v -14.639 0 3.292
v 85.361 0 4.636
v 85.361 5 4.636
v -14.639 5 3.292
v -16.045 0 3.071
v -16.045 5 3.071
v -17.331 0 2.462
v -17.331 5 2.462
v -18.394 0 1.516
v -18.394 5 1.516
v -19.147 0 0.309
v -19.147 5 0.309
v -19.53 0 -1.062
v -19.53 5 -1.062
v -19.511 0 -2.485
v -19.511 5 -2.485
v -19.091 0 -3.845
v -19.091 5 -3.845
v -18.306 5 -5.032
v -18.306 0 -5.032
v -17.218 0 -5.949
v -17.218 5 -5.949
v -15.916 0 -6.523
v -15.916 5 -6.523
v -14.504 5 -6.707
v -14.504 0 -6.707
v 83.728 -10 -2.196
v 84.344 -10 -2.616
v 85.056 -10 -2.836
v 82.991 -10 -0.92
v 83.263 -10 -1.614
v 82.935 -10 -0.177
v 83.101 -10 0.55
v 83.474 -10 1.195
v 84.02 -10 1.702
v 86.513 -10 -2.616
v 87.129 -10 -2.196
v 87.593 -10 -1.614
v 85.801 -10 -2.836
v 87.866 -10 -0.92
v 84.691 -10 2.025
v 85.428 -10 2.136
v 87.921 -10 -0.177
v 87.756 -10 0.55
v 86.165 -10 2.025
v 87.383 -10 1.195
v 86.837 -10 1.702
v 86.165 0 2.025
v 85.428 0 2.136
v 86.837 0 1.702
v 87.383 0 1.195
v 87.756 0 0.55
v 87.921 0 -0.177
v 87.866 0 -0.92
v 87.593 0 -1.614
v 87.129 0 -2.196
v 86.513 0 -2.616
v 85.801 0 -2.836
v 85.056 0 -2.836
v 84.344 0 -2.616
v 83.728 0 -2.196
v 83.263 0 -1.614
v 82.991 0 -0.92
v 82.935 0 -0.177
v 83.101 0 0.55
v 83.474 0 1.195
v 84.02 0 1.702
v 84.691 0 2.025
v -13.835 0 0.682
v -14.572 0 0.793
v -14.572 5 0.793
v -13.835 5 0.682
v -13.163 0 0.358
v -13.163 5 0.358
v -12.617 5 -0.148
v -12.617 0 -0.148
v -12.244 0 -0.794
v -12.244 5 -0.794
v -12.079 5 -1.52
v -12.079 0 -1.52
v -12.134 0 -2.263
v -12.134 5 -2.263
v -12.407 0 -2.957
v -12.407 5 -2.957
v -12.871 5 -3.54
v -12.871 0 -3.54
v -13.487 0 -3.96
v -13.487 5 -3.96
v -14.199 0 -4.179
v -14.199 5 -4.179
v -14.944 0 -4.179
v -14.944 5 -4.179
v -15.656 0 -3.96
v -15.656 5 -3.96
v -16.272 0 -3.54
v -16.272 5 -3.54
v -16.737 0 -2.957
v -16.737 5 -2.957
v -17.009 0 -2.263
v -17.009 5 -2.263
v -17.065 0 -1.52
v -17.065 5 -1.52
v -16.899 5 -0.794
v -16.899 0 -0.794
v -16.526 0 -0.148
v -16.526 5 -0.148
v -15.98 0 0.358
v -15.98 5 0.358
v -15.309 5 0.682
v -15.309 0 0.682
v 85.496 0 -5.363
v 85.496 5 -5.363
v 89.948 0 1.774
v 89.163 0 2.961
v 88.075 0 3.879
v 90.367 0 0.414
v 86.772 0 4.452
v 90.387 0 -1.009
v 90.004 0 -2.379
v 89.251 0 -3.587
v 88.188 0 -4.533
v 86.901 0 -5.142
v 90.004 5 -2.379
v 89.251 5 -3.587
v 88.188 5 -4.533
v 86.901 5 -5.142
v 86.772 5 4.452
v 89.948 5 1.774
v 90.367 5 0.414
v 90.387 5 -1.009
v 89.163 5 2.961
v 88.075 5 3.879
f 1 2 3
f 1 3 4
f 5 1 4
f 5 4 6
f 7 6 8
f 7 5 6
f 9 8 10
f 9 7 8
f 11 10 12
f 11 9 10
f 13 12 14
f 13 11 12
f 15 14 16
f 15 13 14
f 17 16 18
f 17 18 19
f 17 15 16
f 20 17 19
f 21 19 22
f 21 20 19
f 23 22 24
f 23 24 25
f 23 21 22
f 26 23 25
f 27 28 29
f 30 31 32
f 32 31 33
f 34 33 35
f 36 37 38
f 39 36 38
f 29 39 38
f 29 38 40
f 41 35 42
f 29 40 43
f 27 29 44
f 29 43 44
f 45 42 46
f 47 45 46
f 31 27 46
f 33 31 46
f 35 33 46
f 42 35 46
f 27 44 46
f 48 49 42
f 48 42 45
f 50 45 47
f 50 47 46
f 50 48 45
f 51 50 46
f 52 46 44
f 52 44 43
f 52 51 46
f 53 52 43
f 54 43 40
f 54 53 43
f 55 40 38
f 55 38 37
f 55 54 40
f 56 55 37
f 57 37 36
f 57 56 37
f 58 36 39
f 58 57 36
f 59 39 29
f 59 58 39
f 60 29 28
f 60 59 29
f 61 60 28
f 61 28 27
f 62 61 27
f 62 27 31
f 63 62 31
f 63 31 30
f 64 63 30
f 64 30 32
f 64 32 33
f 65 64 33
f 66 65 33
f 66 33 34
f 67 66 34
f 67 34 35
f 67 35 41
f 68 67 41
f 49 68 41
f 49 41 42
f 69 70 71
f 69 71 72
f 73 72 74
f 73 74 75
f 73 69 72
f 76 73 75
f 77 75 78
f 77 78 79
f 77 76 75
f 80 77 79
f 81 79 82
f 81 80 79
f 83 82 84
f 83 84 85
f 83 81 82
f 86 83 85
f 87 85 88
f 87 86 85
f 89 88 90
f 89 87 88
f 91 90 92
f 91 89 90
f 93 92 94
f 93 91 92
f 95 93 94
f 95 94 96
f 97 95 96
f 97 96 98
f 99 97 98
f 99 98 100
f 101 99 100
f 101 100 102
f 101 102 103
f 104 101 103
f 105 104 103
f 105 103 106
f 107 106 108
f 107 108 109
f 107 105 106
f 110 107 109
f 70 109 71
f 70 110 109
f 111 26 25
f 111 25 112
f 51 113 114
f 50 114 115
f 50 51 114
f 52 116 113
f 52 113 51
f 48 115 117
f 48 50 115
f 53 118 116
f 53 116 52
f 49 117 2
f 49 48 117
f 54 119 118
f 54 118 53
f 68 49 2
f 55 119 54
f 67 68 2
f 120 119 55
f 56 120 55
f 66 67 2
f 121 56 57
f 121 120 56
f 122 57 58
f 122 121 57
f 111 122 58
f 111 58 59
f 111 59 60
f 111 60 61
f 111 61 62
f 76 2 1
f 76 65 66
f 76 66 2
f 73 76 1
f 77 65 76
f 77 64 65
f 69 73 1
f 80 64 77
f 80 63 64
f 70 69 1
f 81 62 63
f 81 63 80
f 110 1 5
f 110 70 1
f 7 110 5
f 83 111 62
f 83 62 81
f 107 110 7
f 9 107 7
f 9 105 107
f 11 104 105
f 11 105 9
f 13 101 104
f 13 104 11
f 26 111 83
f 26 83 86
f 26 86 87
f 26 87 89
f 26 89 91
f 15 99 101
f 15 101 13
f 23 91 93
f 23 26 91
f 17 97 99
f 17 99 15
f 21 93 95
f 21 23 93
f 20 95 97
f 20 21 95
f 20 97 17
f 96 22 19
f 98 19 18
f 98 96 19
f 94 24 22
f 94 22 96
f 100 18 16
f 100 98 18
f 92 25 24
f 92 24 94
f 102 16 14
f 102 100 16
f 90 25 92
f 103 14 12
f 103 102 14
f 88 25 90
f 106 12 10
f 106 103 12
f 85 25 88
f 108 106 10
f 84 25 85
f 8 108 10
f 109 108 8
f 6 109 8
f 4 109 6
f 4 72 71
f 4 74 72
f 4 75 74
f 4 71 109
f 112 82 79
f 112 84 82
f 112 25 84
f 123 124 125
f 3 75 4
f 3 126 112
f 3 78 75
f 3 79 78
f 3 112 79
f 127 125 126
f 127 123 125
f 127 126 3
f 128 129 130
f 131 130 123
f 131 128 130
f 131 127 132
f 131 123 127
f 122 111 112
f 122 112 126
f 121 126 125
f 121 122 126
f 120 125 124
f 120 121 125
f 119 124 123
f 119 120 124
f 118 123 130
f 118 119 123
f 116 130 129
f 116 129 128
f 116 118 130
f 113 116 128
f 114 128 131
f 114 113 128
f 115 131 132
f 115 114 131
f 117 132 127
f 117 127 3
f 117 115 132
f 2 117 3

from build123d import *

# Parameters (mm, degrees)
SKETCH1_R           = 2.5
BOSS_EXTRUDE1_DEPTH = 5
SKETCH2_R           = 2.5
BOSS_EXTRUDE2_DEPTH = 15


with BuildPart() as part:
    # Sketch1 → Boss-Extrude1 (new body)
    with BuildSketch(Plane(origin=(0, 0, 0), x_dir=(1, 0, 0), z_dir=(0, 1, 0))):
        with BuildLine():
            Line((-14.504443595, 6.706697569), (85.495556405, 5.363127511))
            ThreePointArc((85.495556405, 5.363127511), (90.42793273, 0.296406305), (85.361211524, -4.635970021))
            Line((85.361211524, -4.635970021), (-14.638788476, -3.292399963))
            ThreePointArc((-14.638788476, -3.292399963), (-19.571164802, 1.774321243), (-14.504443595, 6.706697569))
        make_face()
        with Locations(Location((-14.571616036, 1.707148803, 0), (0, 0, 270))):
            Circle(SKETCH1_R, mode=Mode.SUBTRACT)
    extrude(amount=BOSS_EXTRUDE1_DEPTH)

    # Sketch2 → Boss-Extrude2 (add)
    with BuildSketch(Plane(origin=(0, 5, 0), x_dir=(1, 0, 0), z_dir=(0, 1, 0))):
        with Locations(Location((85.428383964, 0.363578745, 0), (0, 0, 270))):
            Circle(SKETCH2_R)
    extrude(amount=-BOSS_EXTRUDE2_DEPTH)


solid = part.part
